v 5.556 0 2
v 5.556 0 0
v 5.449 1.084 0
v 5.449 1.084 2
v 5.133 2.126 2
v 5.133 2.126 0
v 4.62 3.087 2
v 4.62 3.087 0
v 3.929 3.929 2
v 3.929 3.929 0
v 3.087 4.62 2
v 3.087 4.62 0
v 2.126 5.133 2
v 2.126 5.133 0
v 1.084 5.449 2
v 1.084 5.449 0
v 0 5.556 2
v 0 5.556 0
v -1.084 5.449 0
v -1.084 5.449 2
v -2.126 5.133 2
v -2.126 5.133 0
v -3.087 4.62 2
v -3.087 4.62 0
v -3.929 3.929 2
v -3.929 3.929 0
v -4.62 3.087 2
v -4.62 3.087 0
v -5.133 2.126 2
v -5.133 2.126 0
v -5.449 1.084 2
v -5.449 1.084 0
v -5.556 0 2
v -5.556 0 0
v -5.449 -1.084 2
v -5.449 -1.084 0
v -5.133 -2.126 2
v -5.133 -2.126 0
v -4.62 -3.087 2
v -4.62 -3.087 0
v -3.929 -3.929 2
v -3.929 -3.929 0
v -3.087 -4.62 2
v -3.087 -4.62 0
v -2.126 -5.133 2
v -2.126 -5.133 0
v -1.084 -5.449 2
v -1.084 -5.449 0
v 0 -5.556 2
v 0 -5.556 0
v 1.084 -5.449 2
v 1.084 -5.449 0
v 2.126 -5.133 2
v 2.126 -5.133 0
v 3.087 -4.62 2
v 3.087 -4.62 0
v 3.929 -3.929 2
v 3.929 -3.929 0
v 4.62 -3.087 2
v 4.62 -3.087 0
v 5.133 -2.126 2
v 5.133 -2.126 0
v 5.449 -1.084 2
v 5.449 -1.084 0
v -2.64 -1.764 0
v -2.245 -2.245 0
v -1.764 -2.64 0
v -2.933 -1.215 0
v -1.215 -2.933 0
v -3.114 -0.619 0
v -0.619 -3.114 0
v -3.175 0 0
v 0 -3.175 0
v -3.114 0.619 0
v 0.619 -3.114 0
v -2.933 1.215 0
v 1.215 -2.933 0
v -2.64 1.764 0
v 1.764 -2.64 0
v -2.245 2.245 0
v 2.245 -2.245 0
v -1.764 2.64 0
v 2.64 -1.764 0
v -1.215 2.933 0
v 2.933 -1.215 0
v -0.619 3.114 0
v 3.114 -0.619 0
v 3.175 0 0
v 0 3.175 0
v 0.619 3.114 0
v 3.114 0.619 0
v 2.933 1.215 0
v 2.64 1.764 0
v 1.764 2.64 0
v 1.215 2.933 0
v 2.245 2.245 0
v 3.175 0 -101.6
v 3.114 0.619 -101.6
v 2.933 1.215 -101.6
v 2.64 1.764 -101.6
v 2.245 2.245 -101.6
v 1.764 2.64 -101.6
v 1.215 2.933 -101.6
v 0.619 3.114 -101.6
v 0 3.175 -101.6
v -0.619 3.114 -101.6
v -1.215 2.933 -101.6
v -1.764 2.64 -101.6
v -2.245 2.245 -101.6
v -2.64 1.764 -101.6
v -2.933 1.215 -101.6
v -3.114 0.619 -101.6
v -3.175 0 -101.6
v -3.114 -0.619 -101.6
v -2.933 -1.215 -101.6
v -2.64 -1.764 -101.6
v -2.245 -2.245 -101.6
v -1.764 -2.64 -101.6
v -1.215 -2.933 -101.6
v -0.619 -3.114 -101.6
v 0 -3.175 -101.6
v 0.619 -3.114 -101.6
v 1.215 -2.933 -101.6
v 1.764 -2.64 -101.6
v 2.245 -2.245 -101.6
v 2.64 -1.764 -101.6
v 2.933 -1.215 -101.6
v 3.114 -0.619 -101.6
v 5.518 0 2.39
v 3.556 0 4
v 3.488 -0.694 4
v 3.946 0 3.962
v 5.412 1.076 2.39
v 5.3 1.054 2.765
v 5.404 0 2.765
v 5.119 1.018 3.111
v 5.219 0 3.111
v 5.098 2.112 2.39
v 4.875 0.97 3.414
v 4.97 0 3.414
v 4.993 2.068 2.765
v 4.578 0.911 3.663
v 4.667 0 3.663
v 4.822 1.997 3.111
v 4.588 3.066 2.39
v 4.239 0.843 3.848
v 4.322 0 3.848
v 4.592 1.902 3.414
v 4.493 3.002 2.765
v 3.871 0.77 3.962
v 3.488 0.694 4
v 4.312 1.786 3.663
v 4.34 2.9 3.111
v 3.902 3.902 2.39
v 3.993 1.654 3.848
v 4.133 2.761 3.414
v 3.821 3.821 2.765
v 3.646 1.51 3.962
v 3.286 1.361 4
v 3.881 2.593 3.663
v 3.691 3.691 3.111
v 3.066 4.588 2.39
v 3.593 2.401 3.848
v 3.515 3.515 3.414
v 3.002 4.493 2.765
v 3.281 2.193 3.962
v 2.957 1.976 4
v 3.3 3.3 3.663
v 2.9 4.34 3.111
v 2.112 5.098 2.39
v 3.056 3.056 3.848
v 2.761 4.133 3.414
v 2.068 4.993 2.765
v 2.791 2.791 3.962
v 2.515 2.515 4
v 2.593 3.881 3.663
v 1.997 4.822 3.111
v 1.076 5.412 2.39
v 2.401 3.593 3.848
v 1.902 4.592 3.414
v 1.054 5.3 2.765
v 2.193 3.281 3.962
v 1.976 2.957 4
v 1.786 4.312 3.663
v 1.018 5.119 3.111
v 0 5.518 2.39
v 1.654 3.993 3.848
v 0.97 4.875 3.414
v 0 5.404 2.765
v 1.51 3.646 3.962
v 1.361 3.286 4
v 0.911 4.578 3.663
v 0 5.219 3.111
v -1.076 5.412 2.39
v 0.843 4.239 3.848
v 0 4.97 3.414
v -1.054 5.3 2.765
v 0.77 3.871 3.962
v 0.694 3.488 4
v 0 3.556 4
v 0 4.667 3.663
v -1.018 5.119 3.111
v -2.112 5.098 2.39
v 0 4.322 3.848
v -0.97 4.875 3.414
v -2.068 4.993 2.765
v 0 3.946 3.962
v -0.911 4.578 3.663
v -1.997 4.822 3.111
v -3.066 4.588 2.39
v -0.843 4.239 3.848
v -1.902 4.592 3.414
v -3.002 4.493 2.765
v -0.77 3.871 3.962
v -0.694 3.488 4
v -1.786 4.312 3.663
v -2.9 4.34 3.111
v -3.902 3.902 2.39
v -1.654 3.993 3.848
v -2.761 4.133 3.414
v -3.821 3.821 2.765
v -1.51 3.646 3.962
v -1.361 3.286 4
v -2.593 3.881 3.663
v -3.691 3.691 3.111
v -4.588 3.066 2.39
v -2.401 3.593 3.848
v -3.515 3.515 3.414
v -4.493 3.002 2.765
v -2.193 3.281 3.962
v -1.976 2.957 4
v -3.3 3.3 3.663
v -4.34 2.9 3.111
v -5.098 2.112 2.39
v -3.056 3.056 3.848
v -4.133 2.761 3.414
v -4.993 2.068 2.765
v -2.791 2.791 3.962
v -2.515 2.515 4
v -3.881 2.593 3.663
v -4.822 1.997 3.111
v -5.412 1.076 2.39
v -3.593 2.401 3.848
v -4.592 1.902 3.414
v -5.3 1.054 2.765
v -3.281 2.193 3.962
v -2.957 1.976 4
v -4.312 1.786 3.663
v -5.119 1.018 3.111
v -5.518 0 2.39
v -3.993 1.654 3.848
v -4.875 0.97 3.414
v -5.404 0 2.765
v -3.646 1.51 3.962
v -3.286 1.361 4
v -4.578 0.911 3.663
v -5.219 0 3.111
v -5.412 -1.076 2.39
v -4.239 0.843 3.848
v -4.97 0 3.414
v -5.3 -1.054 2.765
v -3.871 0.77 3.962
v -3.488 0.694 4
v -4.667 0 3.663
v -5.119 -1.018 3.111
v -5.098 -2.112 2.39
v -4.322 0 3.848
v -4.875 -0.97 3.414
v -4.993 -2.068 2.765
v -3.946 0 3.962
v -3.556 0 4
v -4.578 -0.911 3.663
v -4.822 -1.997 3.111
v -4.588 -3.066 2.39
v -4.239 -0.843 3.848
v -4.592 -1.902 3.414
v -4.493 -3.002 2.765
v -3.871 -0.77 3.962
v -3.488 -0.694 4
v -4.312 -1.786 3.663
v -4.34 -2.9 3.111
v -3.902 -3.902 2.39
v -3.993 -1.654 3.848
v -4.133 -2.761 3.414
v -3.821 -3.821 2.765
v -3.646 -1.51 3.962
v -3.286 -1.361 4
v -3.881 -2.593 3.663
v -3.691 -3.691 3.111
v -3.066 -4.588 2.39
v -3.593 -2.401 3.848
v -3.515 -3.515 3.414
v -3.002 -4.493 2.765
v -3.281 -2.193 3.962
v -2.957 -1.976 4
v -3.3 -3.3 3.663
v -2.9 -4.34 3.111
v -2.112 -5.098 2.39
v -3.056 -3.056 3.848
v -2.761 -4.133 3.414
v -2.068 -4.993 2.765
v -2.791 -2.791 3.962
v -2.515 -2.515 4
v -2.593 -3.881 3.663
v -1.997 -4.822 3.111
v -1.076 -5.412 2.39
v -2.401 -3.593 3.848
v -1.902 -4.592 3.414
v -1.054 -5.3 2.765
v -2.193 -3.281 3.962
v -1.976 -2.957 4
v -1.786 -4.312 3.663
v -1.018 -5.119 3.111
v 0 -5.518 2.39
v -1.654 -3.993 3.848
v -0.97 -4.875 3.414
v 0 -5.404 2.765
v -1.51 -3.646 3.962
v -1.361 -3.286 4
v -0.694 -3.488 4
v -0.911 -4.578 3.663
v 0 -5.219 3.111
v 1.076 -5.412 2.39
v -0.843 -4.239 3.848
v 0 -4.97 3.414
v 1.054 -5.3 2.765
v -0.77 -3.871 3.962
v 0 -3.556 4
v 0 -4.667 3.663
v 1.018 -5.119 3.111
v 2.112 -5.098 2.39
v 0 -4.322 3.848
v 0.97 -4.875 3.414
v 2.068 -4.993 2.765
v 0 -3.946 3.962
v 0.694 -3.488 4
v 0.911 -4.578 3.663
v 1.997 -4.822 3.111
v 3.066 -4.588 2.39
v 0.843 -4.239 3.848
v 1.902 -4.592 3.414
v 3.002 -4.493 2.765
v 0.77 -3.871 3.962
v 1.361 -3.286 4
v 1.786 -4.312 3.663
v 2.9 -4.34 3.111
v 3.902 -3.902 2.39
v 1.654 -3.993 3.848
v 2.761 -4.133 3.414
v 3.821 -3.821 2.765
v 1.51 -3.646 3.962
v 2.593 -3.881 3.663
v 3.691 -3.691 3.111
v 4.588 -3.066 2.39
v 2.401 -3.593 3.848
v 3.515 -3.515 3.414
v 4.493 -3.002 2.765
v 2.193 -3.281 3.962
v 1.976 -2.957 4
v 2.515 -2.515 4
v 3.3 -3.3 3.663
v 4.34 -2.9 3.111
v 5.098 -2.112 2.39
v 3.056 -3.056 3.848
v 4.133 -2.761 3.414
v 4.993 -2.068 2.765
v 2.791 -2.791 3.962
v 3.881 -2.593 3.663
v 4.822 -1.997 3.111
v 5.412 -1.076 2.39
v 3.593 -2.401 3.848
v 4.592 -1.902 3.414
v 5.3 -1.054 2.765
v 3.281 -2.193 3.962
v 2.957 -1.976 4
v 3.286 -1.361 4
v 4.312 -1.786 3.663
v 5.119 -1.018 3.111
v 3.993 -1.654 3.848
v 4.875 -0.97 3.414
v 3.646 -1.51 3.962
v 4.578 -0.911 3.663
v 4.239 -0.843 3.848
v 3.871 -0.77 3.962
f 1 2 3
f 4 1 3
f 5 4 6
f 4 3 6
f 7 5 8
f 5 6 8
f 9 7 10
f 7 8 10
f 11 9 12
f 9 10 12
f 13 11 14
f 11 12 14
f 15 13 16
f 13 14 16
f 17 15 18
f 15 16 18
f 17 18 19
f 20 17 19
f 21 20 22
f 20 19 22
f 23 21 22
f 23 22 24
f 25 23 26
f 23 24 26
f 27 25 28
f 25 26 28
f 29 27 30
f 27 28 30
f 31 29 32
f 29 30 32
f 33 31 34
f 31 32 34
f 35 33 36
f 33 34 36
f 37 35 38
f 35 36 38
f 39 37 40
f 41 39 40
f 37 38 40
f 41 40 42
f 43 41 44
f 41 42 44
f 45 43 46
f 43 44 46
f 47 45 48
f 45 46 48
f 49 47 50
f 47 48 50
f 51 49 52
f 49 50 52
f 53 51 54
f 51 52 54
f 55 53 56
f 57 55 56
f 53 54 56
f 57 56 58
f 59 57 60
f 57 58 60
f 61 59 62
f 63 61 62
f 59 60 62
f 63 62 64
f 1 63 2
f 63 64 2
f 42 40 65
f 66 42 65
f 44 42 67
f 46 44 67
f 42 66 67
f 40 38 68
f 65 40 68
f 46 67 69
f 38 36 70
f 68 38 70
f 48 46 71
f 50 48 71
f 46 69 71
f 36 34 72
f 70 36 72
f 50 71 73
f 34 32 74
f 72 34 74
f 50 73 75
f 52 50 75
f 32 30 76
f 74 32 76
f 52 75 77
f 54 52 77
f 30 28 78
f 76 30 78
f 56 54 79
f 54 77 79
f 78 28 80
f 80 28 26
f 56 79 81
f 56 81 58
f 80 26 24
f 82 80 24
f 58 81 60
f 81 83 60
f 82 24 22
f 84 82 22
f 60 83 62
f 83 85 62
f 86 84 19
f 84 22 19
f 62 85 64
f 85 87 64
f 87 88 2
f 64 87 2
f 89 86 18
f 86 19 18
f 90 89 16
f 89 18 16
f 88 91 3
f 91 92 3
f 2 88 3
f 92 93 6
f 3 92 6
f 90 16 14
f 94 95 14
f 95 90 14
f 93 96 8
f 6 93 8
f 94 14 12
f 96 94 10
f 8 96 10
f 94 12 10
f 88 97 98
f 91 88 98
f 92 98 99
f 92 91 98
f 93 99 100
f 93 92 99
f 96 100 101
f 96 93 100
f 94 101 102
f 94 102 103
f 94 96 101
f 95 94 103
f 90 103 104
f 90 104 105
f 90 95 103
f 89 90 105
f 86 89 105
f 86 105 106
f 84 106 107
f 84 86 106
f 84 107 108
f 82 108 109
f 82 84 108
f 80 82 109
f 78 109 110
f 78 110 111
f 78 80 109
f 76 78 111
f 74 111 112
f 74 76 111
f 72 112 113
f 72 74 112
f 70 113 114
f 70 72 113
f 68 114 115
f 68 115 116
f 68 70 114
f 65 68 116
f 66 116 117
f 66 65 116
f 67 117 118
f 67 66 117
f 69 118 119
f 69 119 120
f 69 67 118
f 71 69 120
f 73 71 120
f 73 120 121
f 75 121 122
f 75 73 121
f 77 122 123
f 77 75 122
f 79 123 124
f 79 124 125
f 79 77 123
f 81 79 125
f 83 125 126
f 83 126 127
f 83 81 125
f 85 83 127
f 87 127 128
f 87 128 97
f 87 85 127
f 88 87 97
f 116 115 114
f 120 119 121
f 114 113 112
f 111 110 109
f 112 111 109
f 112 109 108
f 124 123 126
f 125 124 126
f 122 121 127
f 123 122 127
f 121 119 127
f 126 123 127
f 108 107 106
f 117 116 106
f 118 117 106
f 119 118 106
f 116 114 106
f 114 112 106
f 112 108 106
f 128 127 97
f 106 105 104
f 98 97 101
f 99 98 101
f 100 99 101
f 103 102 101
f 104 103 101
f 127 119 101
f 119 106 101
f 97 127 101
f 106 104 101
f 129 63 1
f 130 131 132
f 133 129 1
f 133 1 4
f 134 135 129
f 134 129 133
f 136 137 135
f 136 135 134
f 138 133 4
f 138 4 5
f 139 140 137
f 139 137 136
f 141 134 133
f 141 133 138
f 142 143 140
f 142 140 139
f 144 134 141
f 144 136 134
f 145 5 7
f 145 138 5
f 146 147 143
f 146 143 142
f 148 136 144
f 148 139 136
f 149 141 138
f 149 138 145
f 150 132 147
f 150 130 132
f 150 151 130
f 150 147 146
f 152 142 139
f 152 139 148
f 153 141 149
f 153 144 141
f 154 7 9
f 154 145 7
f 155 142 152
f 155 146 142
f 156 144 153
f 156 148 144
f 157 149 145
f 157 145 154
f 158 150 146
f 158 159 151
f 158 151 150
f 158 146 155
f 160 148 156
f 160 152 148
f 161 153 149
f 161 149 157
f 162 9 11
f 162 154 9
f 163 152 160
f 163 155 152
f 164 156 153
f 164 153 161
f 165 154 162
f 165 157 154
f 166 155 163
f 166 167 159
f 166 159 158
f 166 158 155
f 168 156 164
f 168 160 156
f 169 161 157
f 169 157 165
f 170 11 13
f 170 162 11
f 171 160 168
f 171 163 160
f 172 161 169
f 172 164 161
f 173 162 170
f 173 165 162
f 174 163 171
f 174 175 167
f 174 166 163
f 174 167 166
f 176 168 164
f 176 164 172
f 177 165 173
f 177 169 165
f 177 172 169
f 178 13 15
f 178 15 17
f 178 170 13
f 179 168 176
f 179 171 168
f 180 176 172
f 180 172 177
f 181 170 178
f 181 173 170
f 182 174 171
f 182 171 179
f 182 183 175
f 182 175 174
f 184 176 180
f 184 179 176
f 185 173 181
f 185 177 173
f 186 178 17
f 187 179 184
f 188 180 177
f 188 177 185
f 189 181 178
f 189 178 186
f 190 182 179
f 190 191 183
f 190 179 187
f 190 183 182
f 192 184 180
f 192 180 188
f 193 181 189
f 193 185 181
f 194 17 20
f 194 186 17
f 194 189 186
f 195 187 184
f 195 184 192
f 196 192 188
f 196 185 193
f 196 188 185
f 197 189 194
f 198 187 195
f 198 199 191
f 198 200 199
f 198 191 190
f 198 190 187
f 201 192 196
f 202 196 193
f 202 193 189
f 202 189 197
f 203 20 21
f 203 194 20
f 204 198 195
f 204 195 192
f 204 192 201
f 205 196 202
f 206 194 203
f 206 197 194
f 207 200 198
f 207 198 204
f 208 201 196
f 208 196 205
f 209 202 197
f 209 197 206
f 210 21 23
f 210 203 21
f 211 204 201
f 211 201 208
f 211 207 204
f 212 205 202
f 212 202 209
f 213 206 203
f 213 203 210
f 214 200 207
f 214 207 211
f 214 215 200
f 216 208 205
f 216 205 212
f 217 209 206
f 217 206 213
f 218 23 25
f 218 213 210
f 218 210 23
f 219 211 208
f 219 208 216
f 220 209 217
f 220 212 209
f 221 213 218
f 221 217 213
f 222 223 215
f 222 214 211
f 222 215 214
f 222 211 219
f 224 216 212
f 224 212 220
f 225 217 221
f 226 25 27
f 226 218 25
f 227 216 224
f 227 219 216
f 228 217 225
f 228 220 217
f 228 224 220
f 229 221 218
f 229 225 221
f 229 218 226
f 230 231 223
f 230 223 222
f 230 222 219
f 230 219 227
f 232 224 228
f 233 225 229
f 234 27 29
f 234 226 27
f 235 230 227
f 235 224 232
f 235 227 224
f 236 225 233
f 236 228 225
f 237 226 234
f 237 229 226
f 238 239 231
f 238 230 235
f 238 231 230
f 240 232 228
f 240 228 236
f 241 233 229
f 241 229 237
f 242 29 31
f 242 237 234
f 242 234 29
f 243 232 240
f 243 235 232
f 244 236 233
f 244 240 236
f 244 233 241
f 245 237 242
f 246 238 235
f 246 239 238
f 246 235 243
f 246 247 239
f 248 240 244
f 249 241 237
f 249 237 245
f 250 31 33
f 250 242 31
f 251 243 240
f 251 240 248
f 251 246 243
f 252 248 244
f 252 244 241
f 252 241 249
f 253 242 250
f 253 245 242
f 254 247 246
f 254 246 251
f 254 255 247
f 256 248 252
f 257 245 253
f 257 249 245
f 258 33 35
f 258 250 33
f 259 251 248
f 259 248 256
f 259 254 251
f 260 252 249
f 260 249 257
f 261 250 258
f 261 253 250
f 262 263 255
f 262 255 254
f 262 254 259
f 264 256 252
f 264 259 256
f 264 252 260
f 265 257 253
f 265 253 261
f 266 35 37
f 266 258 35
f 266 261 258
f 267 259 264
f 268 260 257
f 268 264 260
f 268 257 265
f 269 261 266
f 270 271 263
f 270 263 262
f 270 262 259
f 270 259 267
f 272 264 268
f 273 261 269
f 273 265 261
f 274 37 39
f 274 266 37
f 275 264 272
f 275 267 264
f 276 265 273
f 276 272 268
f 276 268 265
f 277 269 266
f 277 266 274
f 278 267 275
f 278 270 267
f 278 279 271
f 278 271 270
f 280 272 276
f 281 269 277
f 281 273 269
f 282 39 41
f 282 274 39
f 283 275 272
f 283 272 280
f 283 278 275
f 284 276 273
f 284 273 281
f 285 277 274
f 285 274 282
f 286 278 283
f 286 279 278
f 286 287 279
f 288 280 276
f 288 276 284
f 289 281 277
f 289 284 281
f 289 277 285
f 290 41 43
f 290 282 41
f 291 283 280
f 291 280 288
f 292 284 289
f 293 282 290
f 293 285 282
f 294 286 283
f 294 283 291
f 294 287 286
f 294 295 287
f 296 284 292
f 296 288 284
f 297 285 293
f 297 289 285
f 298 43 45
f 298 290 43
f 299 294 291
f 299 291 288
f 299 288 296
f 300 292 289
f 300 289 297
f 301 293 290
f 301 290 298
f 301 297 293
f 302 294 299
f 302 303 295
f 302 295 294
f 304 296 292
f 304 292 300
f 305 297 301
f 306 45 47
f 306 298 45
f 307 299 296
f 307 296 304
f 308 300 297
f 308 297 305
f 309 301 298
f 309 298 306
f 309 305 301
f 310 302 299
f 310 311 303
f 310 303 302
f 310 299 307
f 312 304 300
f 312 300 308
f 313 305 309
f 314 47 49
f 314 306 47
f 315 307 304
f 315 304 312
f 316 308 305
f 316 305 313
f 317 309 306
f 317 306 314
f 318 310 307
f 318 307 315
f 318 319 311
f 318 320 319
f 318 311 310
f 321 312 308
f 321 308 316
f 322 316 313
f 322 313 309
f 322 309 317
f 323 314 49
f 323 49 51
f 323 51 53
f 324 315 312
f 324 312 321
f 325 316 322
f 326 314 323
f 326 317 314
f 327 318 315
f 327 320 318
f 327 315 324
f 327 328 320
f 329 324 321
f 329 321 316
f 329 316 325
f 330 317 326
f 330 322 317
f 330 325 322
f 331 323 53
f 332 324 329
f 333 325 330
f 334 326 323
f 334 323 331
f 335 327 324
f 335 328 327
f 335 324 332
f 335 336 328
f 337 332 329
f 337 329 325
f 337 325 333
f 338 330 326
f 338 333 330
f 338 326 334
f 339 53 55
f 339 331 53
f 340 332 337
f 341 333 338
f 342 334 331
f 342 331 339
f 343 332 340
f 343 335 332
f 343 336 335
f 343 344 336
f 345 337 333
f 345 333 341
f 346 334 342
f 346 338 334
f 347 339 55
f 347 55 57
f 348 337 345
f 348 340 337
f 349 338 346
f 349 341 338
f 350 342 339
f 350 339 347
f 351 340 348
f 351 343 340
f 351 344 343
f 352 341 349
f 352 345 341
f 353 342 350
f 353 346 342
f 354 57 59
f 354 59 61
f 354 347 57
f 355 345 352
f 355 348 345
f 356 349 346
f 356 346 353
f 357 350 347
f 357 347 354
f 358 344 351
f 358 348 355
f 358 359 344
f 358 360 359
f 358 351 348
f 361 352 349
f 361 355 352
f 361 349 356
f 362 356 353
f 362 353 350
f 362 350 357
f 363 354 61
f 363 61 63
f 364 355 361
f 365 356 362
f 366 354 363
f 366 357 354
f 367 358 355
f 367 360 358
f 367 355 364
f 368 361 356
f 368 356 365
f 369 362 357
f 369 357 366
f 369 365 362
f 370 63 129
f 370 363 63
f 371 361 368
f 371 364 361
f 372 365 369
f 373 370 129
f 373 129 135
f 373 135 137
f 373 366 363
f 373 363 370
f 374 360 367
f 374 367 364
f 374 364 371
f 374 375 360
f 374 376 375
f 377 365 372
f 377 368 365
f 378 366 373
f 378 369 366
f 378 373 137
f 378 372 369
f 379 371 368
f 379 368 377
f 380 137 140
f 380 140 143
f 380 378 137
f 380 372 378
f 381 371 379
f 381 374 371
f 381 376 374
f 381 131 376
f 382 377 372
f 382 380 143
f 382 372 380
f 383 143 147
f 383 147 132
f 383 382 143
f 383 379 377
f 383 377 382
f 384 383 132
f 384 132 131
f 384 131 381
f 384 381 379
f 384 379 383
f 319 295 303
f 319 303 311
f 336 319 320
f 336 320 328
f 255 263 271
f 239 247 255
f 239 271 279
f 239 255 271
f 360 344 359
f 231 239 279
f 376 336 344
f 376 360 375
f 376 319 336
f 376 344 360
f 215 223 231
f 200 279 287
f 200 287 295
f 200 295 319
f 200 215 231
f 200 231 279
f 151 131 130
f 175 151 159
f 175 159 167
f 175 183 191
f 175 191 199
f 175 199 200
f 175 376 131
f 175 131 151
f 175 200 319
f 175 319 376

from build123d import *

# Parameters (mm, degrees)
SKETCH1_R         = 3.175
SCREWLENGTH_DEPTH = 101.6
SKETCH2_R         = 5.55625
HEAD_DEPTH        = 4
FILLET4_R         = 2


with BuildPart() as part:
    # Sketch1 → Screwlength (new body)
    with BuildSketch(Plane.XY):
        Circle(SKETCH1_R)
    extrude(amount=-SCREWLENGTH_DEPTH)

    # Sketch2 → Head (add)
    with BuildSketch(Plane.XY):
        Circle(SKETCH2_R)
    extrude(amount=HEAD_DEPTH)

    # Fillet4
    fillet4_edges = [part.edges().sort_by_distance(p)[0] for p in [
        (-5.55625, 0, 4),
    ]]
    fillet(fillet4_edges, radius=FILLET4_R)


solid = part.part
